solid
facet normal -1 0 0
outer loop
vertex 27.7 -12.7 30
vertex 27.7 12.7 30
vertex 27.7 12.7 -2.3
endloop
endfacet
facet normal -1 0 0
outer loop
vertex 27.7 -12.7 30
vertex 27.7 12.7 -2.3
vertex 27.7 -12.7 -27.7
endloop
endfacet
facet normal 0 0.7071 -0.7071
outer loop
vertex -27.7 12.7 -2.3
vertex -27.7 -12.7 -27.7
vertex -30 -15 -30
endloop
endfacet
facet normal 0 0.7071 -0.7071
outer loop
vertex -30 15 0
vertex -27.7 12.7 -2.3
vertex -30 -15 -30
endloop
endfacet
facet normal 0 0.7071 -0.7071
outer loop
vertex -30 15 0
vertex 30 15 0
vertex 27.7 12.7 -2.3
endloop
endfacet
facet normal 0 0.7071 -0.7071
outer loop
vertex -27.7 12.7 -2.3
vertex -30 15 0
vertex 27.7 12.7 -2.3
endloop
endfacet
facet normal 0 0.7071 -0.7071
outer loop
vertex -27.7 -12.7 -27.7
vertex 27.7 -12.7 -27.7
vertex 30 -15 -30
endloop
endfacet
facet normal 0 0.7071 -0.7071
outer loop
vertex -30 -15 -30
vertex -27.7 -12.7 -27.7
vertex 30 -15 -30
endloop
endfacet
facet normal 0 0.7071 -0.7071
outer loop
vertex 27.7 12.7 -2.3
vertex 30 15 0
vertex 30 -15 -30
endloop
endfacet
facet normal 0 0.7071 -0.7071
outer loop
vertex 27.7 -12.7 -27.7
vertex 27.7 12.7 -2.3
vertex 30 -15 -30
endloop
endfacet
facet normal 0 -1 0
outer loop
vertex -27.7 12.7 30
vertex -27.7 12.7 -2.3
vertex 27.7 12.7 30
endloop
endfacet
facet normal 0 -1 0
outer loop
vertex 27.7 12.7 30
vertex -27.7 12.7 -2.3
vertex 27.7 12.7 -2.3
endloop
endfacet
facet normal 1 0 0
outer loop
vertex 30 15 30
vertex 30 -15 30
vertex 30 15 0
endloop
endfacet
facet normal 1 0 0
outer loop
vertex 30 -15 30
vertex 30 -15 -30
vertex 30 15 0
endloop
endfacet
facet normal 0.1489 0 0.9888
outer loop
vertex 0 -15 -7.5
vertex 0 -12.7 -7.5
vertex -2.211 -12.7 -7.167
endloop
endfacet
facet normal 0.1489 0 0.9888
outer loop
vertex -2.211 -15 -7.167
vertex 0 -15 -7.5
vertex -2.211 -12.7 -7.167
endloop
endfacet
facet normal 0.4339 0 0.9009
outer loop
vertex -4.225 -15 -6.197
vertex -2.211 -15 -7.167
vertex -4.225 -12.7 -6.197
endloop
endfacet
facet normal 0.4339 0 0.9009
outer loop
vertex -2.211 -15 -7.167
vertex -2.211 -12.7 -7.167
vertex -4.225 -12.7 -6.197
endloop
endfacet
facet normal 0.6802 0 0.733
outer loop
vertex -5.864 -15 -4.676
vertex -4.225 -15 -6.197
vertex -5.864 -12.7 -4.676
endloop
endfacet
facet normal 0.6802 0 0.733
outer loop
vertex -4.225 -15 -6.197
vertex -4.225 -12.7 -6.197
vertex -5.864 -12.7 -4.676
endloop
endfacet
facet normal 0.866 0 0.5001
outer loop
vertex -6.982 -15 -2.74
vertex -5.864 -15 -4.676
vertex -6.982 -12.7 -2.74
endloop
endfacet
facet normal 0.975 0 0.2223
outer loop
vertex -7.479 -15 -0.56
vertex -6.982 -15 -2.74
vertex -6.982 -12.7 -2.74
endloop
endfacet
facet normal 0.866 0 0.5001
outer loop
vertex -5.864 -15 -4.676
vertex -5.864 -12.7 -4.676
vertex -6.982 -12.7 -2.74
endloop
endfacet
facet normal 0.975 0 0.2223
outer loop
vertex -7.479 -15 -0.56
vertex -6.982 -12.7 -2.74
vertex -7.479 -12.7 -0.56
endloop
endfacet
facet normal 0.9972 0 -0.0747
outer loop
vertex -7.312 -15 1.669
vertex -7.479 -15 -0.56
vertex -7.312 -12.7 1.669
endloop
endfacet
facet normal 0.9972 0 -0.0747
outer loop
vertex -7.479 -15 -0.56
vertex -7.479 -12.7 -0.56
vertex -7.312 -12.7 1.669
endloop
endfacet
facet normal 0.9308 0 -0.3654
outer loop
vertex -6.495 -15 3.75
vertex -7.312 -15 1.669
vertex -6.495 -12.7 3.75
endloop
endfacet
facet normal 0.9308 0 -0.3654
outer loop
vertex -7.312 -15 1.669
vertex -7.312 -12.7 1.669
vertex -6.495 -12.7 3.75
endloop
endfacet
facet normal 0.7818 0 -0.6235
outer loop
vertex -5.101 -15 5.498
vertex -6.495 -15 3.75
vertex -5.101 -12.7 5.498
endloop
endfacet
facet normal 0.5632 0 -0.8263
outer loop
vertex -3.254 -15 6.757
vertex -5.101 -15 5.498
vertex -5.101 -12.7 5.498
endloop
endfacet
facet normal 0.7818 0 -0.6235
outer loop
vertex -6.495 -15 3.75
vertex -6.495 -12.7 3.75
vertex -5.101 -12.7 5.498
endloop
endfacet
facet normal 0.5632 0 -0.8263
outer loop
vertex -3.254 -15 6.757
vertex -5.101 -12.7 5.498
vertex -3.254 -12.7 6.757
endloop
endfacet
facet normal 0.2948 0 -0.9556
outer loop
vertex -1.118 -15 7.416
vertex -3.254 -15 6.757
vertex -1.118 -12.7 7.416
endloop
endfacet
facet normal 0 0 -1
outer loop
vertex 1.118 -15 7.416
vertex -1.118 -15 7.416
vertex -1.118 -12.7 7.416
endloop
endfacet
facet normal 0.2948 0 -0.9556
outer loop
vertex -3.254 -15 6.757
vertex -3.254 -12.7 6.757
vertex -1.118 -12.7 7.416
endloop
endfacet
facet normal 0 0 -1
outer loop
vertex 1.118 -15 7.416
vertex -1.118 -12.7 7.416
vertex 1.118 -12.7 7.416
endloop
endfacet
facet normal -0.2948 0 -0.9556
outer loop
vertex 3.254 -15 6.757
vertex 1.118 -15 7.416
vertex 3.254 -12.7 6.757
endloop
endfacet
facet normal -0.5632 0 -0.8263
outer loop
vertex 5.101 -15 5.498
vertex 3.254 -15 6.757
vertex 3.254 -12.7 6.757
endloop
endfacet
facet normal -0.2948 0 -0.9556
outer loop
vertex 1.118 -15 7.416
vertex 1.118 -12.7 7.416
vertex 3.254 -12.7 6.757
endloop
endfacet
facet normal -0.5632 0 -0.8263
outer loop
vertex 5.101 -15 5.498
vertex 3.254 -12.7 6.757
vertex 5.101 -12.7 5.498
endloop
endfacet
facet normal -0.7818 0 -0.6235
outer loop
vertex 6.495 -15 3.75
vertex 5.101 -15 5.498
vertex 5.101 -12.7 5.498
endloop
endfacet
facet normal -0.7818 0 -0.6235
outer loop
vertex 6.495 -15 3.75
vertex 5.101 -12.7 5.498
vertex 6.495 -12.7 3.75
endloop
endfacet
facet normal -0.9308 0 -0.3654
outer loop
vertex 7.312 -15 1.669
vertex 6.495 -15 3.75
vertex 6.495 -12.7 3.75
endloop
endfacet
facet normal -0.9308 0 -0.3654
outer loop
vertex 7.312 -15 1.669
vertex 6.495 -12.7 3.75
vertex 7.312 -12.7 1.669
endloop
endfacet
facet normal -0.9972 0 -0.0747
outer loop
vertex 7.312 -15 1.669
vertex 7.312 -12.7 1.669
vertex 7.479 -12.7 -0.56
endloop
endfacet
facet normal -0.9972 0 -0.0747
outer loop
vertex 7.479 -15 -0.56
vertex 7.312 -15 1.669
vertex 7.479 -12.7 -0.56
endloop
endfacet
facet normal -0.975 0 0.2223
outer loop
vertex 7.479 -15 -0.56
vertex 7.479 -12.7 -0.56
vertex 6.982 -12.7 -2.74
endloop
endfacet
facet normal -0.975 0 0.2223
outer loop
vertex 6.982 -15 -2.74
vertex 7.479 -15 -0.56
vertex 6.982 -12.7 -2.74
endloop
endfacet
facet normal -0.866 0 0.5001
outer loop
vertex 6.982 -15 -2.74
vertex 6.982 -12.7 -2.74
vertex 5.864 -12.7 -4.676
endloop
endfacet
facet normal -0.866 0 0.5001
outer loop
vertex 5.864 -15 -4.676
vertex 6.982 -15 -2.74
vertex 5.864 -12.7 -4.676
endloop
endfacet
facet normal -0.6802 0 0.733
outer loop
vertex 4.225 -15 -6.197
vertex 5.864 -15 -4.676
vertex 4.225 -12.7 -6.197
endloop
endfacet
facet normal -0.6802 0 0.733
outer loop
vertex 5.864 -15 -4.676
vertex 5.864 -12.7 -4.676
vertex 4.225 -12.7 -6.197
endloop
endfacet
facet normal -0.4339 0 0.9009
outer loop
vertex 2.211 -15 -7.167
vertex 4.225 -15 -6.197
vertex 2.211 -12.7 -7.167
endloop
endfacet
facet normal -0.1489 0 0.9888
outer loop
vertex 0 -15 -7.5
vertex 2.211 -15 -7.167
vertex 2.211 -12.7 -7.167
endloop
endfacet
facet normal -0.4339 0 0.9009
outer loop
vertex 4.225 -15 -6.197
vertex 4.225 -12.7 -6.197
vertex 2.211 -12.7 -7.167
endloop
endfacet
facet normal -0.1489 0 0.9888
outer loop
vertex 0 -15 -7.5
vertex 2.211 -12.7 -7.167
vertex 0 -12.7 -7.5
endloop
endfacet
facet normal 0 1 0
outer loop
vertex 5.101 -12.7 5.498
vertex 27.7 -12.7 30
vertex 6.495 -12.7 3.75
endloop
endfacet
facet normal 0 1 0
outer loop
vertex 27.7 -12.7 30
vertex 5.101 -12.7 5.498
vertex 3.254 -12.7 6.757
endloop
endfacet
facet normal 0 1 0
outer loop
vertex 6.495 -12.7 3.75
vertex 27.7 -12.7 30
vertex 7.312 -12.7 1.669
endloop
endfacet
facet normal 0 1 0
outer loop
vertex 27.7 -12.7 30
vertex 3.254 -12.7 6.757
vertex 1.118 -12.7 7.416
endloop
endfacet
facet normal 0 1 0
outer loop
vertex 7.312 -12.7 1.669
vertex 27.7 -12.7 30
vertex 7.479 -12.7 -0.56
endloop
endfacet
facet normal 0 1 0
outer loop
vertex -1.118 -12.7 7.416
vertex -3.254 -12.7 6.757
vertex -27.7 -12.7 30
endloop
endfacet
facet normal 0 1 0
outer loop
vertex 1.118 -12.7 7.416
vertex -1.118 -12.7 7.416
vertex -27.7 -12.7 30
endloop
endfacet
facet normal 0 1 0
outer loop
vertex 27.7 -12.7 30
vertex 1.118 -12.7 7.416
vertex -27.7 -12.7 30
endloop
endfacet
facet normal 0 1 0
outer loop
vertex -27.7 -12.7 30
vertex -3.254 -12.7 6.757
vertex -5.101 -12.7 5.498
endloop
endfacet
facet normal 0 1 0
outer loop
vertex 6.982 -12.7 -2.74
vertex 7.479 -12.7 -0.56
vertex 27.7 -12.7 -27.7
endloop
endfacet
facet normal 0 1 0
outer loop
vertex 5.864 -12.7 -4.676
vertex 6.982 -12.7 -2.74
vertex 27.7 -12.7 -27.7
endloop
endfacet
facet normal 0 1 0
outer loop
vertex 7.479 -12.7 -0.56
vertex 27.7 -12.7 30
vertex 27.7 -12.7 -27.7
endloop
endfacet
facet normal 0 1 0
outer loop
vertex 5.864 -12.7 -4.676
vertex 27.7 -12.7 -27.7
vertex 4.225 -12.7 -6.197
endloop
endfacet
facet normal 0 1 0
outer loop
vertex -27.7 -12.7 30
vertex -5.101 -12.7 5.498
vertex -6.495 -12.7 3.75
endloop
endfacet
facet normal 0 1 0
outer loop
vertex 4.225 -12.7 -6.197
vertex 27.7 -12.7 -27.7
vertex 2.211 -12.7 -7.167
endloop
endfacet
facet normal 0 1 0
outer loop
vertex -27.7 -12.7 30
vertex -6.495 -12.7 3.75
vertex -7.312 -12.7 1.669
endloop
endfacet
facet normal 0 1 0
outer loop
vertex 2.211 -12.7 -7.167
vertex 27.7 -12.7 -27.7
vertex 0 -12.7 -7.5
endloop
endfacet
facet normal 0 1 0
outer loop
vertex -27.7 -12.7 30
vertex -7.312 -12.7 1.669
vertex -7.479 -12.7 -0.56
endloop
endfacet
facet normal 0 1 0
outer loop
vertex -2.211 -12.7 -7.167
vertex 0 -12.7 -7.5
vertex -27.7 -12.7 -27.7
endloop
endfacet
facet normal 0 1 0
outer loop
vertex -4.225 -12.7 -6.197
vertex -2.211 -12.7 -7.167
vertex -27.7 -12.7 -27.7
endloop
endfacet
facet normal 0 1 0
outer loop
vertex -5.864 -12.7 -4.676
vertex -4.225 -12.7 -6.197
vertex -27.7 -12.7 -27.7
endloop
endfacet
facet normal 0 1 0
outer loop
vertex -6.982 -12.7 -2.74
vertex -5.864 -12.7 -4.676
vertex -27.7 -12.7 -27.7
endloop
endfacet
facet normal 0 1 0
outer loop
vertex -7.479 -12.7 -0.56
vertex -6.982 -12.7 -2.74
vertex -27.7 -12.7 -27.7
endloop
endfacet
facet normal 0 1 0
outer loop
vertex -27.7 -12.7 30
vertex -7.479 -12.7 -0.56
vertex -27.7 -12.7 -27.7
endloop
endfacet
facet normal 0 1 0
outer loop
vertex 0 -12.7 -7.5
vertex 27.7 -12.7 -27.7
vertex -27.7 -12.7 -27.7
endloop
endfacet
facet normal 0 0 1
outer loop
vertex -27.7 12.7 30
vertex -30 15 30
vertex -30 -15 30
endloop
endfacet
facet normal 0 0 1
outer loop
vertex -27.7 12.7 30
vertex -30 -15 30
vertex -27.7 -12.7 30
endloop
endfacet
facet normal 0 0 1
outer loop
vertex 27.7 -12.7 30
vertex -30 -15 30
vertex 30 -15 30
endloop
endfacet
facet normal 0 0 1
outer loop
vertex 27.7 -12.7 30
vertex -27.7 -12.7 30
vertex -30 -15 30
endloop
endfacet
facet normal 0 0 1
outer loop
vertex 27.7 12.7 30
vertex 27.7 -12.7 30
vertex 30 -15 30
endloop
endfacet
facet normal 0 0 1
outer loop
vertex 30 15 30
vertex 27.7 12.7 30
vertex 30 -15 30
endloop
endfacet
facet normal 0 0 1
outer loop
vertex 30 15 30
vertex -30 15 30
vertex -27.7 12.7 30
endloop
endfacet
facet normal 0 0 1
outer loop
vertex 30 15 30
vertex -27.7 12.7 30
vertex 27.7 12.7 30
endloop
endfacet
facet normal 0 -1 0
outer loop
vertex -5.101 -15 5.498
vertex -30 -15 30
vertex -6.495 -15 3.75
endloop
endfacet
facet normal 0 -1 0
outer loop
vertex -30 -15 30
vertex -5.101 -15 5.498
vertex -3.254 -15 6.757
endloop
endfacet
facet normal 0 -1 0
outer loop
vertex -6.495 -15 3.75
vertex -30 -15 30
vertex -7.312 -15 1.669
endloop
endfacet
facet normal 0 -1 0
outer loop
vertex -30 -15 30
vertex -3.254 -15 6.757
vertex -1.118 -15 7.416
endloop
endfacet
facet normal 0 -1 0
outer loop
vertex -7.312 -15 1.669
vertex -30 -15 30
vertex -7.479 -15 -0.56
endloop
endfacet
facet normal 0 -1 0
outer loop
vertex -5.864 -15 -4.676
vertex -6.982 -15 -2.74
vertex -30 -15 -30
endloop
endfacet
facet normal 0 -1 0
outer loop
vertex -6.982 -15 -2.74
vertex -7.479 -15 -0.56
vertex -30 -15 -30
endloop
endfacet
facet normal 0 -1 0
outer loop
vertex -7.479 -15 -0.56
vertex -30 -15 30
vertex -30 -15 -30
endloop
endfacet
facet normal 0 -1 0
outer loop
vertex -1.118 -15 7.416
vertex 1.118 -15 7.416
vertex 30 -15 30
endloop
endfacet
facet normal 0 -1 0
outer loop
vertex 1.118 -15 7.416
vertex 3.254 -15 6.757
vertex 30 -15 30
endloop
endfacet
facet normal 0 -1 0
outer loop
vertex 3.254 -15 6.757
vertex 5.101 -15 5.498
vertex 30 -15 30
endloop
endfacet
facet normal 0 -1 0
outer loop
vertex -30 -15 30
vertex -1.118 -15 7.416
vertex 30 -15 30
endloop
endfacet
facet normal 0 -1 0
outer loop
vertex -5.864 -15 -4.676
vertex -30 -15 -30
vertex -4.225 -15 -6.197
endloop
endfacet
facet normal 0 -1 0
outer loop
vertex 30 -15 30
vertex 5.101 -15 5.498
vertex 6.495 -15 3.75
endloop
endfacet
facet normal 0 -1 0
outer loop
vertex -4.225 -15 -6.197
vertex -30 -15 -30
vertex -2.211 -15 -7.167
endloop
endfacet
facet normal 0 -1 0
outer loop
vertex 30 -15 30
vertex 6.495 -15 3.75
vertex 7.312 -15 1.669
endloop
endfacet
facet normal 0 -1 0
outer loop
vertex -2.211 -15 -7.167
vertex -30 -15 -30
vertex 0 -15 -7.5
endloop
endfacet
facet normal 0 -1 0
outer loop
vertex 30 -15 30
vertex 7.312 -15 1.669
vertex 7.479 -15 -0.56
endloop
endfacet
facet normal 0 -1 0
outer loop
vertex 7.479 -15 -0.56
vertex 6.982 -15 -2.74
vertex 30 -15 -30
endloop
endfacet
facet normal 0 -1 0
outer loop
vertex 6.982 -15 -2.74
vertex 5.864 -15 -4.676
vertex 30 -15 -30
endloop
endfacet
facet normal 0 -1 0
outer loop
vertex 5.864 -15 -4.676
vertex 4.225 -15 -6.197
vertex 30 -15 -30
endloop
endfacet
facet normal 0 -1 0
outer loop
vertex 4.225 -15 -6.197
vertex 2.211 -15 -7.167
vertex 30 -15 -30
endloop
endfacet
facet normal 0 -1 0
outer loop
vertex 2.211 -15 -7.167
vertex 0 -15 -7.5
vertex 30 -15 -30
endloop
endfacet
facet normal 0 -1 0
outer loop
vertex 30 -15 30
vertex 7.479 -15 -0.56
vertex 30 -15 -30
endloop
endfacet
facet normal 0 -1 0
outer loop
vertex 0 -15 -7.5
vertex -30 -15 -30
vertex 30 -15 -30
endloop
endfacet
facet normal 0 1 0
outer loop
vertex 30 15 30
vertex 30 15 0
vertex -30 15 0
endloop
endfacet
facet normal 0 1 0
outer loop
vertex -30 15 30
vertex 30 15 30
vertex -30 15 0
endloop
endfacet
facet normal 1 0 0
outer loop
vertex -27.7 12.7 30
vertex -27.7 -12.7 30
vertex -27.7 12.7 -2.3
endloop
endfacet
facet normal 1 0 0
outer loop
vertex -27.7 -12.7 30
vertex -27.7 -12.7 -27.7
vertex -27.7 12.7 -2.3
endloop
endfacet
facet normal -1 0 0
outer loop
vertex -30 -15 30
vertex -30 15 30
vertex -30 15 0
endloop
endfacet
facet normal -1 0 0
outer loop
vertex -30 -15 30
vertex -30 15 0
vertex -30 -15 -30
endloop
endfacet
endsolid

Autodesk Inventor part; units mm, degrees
ref_plane "YZ Plane" through (0, 0, 0) normal (1, 0, 0) x (0, 1, 0)
ref_plane "XZ Plane" through (0, 0, 0) normal (0, 1, 0) x (-1, 0, 0)
ref_plane "XY Plane" through (0, 0, 0) normal (0, 0, 1) x (1, 0, 0)
sketch "スケッチ1" plane through (0, 0, 0) normal (0, 0, 1) x (1, 0, 0)
  line L0 (-30, -15) -> (30, -15)
  line L1 (30, -15) -> (30, 15)
  line L2 (30, 15) -> (-30, 15)
  line L3 (-30, 15) -> (-30, -15)
  line L4 (-30, -15) -> (30, 15) construction
  line L5 (30, -15) -> (-30, 15) construction
  line L6 (-27.7, 12.7) -> (27.7, 12.7)
  line L7 (27.7, 12.7) -> (27.7, -12.7)
  line L8 (27.7, -12.7) -> (-27.7, -12.7)
  line L9 (-27.7, -12.7) -> (-27.7, 12.7)
  point P0 (0, 0)
  dimension "d0" = 60
  dimension "d1" = 30
  dimension "d2" = 2.3
extrude "押し出し1" add sketch "スケッチ1" along normal mid plane 60
chamfer "面取り1" distance 30 angle 45 1 edges at (0, 15, -30)
sketch "スケッチ2" plane through (-30, -15, 30) normal (0, -1, 0) x (1, 0, 0)
  point P0 (30, -30)
  point P1 (30, -30)
hole "穴1" at (0, -15, 0) direction (0, 1, 0) diameter 15 depth 10 tip angle 118
properties part number "車軸受け2"
